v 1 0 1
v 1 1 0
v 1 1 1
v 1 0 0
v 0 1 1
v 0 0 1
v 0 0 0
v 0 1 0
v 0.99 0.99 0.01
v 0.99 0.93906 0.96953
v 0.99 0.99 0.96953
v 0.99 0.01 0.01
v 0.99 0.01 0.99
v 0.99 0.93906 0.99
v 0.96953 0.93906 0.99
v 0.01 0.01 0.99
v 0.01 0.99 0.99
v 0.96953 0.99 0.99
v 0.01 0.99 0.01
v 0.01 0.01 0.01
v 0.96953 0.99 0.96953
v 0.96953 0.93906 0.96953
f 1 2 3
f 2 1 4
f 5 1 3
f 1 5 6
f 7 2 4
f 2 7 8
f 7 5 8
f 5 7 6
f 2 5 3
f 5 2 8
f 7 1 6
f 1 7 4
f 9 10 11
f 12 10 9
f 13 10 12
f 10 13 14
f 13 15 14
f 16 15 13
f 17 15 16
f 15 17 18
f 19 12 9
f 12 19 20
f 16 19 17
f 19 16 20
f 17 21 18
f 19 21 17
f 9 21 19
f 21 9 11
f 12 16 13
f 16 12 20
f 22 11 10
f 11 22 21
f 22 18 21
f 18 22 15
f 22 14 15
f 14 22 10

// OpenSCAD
translate([0.984375, 0.96875, 0.984375]) color([0.6752891164641136, 0.29017518075598103, 0.4342964607752302]) cube([0.0296875, 0.059375, 0.0296875], center=true);
translate([0.984375, 0.96875, 0.984375]) color([0.773003957160343, 0.565247166210502, 0.9239404304157245]) cube([0.0296875, 0.059375, 0.0296875], center=true);
translate([0.984375, 0.96875, 0.984375]) color([0.16032310979410902, 0.8355206000915061, 0.5688487402091276]) cube([0.0296875, 0.059375, 0.0296875], center=true);
translate([0.984375, 0.96875, 0.984375]) color([0.20030491603062106, 0.9799112189115262, 0.7788088383598656]) cube([0.0296875, 0.059375, 0.0296875], center=true);
translate([0.984375, 0.96875, 0.984375]) color([0.3331229107175697, 0.956723341350572, 0.8892995412421422]) cube([0.0296875, 0.059375, 0.0296875], center=true);
translate([0.984375, 0.96875, 0.984375]) color([0.9938355783742772, 0.5564778243748569, 0.9329279768345969]) cube([0.0296875, 0.059375, 0.0296875], center=true);
color([0.3,0.3,0.3,0.3]) difference() { cube([1,1,1]); translate([0.01,0.01,0.01]) cube([0.98,0.98,0.98]); }
